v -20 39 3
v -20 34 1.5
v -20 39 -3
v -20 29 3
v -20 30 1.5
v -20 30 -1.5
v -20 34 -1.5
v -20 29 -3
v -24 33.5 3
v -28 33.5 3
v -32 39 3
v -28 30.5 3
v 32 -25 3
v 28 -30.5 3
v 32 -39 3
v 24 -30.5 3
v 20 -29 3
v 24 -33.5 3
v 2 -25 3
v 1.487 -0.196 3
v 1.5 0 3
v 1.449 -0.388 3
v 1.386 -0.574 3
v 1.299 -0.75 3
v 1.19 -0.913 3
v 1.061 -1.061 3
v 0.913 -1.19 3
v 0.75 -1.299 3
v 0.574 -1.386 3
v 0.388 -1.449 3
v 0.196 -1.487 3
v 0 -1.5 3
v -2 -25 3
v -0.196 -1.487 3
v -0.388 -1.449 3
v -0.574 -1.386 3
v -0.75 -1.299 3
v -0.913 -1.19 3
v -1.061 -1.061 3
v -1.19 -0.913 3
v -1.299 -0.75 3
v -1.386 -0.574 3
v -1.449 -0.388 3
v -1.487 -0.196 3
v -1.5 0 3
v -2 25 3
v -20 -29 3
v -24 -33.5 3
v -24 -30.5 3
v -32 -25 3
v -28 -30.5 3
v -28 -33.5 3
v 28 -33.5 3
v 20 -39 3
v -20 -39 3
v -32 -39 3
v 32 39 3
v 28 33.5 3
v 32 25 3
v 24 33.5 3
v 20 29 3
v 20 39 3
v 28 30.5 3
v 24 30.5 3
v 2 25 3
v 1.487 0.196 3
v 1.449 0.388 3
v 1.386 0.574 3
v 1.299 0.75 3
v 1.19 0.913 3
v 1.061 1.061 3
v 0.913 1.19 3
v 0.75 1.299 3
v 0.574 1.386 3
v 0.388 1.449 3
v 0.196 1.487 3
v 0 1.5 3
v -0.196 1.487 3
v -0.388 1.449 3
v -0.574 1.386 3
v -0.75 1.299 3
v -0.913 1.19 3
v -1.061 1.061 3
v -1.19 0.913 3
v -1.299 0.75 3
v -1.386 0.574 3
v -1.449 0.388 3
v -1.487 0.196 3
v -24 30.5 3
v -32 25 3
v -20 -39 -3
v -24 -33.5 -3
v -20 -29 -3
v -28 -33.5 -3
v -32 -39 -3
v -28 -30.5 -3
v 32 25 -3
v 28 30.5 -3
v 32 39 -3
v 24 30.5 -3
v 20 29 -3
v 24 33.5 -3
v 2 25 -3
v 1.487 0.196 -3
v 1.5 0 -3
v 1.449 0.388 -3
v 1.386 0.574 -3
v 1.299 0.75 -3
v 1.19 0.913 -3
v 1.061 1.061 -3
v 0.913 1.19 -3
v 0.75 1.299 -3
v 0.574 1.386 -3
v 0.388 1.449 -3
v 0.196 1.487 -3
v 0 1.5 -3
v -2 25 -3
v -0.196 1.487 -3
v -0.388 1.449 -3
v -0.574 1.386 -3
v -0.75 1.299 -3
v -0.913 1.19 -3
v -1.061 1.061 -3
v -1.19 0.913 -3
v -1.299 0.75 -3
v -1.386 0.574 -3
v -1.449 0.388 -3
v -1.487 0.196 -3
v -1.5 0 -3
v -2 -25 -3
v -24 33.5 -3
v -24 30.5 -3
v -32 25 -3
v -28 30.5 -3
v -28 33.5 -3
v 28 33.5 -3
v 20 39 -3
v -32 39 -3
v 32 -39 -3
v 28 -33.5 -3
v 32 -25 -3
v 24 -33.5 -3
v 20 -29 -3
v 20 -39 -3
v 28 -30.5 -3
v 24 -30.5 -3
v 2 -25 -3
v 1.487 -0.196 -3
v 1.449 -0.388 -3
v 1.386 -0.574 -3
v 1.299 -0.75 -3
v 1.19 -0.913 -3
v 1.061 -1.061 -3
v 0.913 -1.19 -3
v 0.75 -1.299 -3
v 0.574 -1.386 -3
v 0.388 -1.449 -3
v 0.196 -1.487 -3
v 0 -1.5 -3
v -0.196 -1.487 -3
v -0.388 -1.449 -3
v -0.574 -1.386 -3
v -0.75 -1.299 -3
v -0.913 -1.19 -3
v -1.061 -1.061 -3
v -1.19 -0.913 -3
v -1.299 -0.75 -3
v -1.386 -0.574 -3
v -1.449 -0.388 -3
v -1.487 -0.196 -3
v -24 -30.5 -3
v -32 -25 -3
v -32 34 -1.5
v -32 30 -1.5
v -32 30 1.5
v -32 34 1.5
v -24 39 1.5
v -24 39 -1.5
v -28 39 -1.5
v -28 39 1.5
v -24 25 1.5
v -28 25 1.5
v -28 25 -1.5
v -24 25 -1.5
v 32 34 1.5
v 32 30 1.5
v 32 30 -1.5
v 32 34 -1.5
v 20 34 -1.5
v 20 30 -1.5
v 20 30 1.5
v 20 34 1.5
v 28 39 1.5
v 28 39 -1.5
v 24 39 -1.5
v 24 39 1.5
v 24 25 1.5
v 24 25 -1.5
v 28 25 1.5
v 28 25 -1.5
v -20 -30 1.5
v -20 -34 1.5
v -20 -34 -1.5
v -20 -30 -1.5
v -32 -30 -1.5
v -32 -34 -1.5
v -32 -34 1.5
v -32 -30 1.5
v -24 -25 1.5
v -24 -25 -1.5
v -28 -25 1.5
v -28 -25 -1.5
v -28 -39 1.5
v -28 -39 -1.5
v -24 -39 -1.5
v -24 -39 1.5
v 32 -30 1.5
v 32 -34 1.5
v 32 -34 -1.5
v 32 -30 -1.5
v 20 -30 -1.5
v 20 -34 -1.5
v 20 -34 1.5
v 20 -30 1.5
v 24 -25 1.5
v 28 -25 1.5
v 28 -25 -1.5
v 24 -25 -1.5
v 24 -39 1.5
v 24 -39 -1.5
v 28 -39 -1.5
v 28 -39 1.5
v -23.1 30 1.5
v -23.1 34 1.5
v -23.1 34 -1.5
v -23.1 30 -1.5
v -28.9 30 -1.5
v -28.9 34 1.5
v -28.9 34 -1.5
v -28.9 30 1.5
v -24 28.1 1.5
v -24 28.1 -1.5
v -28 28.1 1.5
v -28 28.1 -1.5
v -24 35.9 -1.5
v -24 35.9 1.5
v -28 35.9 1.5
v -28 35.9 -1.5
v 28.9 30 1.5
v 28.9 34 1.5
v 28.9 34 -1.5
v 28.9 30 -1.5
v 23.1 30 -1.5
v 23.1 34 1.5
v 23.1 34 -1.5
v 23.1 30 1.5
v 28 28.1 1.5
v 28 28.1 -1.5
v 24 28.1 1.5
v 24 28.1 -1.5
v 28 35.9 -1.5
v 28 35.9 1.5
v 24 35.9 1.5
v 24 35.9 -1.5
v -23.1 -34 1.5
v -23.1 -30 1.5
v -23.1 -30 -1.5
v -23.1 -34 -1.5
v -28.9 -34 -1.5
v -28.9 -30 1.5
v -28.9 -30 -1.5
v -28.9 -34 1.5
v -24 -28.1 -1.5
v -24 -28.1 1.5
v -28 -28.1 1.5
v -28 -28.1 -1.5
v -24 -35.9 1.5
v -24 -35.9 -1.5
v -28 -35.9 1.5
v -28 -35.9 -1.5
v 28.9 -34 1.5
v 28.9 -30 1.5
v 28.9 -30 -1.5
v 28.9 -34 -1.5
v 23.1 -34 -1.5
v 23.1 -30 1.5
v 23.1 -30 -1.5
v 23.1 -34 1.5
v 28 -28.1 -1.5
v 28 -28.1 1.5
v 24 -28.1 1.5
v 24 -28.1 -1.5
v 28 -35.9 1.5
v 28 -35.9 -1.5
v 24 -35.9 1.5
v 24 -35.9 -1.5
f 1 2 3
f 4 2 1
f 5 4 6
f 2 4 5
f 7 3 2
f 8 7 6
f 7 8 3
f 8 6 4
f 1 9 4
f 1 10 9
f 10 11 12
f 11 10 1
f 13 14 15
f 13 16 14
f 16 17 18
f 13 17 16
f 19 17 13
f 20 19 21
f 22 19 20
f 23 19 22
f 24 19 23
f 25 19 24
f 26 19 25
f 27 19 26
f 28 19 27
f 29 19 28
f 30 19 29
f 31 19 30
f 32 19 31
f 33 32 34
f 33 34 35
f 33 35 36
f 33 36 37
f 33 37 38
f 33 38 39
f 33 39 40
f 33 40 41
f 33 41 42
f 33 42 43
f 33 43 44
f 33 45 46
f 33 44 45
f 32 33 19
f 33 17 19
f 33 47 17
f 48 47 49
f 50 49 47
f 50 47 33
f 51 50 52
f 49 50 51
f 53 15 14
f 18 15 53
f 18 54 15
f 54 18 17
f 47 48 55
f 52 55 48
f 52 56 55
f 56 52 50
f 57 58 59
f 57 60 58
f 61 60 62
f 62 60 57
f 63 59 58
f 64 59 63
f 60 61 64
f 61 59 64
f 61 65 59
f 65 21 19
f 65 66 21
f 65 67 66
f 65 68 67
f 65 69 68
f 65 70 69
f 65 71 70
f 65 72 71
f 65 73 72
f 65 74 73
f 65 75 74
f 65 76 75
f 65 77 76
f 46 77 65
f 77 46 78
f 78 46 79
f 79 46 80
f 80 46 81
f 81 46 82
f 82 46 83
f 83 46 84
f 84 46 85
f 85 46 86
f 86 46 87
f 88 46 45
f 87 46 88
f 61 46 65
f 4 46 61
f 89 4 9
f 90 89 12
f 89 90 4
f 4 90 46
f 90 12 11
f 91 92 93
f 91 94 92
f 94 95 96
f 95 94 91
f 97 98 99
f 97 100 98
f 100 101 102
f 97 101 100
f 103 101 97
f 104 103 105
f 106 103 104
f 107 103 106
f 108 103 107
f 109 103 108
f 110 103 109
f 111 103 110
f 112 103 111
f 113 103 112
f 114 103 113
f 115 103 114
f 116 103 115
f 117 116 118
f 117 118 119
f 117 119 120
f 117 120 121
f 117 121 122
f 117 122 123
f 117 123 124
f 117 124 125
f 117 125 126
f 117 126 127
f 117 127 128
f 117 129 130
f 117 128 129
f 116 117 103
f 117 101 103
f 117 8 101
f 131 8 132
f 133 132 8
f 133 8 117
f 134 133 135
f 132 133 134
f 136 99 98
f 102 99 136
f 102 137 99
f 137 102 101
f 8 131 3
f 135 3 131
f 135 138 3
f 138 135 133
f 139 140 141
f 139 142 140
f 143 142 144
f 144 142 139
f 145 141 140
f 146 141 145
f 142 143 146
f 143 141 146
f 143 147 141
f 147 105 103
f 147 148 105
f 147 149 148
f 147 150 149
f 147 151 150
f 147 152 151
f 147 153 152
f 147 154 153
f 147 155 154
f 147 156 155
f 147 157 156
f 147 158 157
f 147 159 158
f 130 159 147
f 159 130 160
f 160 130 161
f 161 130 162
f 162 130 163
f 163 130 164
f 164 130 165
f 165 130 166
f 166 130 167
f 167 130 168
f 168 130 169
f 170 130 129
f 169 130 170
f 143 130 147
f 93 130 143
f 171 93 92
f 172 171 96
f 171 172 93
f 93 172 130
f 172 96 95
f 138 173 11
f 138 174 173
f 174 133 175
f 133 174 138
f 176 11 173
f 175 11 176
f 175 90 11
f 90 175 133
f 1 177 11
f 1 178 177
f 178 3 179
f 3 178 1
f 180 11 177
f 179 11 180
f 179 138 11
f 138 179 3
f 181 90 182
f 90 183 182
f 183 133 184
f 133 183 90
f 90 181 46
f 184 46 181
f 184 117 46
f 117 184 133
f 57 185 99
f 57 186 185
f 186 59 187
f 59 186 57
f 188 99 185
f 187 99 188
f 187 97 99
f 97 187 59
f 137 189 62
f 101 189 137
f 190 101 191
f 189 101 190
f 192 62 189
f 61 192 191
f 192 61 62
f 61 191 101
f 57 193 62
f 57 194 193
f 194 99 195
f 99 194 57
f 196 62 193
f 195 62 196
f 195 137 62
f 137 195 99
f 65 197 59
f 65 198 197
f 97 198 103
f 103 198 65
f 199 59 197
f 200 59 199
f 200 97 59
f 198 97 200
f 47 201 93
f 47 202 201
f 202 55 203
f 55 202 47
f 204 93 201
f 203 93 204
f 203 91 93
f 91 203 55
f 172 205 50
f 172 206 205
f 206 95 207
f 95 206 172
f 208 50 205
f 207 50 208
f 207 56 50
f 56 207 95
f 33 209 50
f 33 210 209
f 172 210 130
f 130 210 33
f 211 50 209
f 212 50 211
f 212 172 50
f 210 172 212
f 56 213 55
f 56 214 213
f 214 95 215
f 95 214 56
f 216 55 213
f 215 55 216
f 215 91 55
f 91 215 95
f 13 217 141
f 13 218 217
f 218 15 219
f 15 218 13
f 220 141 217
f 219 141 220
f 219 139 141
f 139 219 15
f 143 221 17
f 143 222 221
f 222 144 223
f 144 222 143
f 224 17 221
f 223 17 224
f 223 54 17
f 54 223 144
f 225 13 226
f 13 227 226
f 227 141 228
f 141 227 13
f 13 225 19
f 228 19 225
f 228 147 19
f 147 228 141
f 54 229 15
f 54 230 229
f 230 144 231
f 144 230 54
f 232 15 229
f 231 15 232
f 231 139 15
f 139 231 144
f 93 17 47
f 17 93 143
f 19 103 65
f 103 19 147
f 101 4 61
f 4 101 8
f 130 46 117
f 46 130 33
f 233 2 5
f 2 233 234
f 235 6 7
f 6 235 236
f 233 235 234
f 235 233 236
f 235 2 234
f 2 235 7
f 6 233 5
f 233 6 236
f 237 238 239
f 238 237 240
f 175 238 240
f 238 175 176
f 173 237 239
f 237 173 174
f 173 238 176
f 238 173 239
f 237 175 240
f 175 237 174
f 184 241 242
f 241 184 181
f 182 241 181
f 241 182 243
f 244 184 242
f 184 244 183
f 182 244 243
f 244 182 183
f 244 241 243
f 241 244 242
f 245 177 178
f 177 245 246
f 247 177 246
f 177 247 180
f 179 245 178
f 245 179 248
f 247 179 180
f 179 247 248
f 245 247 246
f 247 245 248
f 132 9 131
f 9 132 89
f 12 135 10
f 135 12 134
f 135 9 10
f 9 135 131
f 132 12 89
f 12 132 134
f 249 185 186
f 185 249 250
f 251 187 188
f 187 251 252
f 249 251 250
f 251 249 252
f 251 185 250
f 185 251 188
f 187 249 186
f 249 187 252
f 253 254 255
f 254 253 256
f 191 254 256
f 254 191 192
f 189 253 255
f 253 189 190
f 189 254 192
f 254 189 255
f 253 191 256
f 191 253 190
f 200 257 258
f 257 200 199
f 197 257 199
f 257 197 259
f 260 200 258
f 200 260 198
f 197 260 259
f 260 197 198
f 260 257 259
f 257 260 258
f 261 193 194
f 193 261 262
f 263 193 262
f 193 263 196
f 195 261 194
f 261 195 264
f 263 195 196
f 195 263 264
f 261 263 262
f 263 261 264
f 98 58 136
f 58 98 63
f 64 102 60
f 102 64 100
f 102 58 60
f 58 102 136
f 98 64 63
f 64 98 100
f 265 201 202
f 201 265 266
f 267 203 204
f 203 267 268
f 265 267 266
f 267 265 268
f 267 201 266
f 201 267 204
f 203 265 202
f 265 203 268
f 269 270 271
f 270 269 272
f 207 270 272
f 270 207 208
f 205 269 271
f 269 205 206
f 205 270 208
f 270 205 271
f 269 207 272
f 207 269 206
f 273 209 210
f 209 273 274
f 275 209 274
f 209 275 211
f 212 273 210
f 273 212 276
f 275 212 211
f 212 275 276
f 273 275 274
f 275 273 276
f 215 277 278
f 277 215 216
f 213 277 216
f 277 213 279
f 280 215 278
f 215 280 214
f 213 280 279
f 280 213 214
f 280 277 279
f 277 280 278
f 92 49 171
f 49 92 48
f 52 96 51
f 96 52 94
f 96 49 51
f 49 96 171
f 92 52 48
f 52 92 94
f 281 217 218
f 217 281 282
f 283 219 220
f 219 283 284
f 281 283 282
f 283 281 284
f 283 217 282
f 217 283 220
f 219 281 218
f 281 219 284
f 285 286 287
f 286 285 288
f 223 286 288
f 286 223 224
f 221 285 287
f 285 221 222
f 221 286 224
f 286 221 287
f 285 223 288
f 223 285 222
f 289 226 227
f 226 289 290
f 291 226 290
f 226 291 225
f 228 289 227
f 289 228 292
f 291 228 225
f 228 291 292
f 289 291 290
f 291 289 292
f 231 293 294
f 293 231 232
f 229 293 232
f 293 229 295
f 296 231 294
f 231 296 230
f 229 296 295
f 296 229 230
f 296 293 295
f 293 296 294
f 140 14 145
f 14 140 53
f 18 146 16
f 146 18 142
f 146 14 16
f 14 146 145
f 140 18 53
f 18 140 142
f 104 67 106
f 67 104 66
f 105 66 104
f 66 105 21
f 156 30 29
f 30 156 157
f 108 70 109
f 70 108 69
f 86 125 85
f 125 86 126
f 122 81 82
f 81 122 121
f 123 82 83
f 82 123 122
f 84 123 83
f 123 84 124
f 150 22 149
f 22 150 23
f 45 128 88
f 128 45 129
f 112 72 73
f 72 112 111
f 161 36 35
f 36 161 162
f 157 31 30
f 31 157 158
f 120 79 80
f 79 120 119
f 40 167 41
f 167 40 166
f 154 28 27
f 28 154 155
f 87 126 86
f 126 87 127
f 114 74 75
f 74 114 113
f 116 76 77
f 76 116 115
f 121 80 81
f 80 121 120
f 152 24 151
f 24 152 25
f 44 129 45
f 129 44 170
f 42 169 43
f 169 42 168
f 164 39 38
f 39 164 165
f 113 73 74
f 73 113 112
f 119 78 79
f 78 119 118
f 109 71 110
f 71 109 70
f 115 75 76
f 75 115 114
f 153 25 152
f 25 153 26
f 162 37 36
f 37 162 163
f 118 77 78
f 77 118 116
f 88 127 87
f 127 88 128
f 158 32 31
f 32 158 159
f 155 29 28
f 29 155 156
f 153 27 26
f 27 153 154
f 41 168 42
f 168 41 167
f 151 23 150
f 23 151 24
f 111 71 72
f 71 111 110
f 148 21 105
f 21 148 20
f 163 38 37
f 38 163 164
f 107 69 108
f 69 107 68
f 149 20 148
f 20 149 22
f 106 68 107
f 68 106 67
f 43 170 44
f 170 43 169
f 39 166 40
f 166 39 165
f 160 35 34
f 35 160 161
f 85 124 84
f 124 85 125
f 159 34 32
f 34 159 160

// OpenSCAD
// 工字形 (I / H 形) 参数化模型 + 4 末端凹形 (U 形槽)
//  凹──────────────凹   <- 上横段两端：凹口向上
//  └──────┬──────┘
//         │            <- 中竖段 web_len
//    凸────┴────凸      <- 下横段两端：凹口向下（即凹形倒置）
//
// 单位：所有尺寸均为毫米 (mm)，1 OpenSCAD 单位 = 1 mm，导出 STL 直接按毫米

/* [基本参数] */
// 笔画粗细（三根线段的宽度/厚度）
thickness = 4;      // 粗细 (mm)
// 上横段长度
top_len    = 40;    // 第1根线段 (mm)
// 中竖段长度
web_len    = 50;    // 第2根线段 (mm)
// 下横段长度
bottom_len = 40;    // 第3根线段 (mm)

/* [3D 拉伸] */
// 工字形拉伸高度（设为 0 则只画 2D 平面）
depth = 6;          // (mm)
// 工字形相对末端凹形的 Z 轴偏移量（末端凹形固定在 Z 中心；正值使工字形向 +Z 移动）
beam_z = 0;         // (mm)
// 工字竖段(中竖段)中心沿 Z 轴的圆通孔直径（≤0 不开孔；需 < thickness 才完全落在竖段内）
web_hole_d = 3;     // (mm)

/* [末端凹形] —— U 形槽，由 4 个参数控制 */
// 凹口宽度（X 方向，两壁之间的开口宽度）
notch_w = 6;        // (mm)
// 深度（Z 方向，凹形拉伸厚度；设为 0 则自动跟随工字形 depth，与主体同厚、两面齐平）
concave_d = 0;      // (mm)
// 高度（Y 方向，凹形伸出横段表面的净高度）
concave_h = 10;     // (mm)
// 壁厚（两侧壁 + ±Z 两面壁(−Z 底壁/+Z 顶壁)的厚度；外廓宽 = 凹口宽 + 2×壁厚；需 深度 > 2×壁厚 才有槽腔）
wall = 3;           // (mm)

/* [末端凹形 — 6 个面矩形通孔] */
// 凹形为六面封闭空心盒；在每个末端的 6 个面（左/右侧壁、底壁、背壁、顶壁、凹口壁）中心各开一个矩形通孔。
// 每个面单独设置：size=[长, 宽]；off=[沿“长”偏移, 沿“宽”偏移]（相对该面中心，mm）。
// 某面 size 的长或宽 <= 0 则该面不开孔。
hole_enable = true;
// 右侧壁 (+X 面)：长沿 Y、宽沿 Z；off=[ΔY, ΔZ]
hole_xp_size = [4, 3];
hole_xp_off  = [0, 0];
// 左侧壁 (−X 面)：长沿 Y、宽沿 Z；off=[ΔY, ΔZ]
hole_xn_size = [4, 3];
hole_xn_off  = [0, 0];
// 底壁 (背离开口的 Y 面)：长沿 X、宽沿 Z；off=[ΔX, ΔZ]
hole_yb_size = [4, 3];
hole_yb_off  = [0, 0];
// 背壁 (−Z 面)：长沿 X、宽沿 Y；off=[ΔX, ΔY]
hole_zn_size = [4, 3];
hole_zn_off  = [0, 0];
// 顶壁 (+Z 面，正上方那面)：长沿 X、宽沿 Y；off=[ΔX, ΔY]
hole_zp_size = [4, 3];
hole_zp_off  = [0, 0];
// 凹口壁 (开口侧 Y 面)：长沿 X、宽沿 Z；off=[ΔX, ΔZ]
hole_ym_size = [4, 3];
hole_ym_off  = [0, 0];

// ---- 工字形主体 ----
module i_beam_2d(thickness, top_len, web_len, bottom_len) {
    // 上横段：顶部居中
    translate([0, web_len/2 + thickness/2])
        square([top_len, thickness], center = true);

    // 中竖段：正中央
    square([thickness, web_len], center = true);

    // 下横段：底部居中
    translate([0, -(web_len/2 + thickness/2)])
        square([bottom_len, thickness], center = true);
}

module i_beam(thickness, top_len, web_len, bottom_len, depth = 0) {
    if (depth > 0)
        linear_extrude(height = depth, center = true)
            i_beam_2d(thickness, top_len, web_len, bottom_len);
    else
        i_beam_2d(thickness, top_len, web_len, bottom_len);
}

// ---- 末端凹形 (U 形槽) ----
// 思路：先把"实心外块"与工字并集，再统一挖"凹槽"。这样凹槽会同时穿过外块和
//      搭接处的横段材料——无论 thickness 多大，槽内都干净，不会被横段穿透。
// 几何约定：外廓宽 = notch_w + 2*wall；Y 向总高 = concave_h(净伸出) + thickness(搭接)；
//          内侧与横段内沿齐平，底部保留 wall 壁厚作底。

// 横段长度 = 两个凹形相对(内)侧之间的距离：凹形内侧边钉在 ±len/2，只向外伸出。
//   len=0 → 两凹形内侧紧贴、不重叠；len>0 → 内侧间距 = len。块中心 = 内侧 + overall_w/2。

// 4 个末端的实心外块（外廓矩形，未挖槽）
module end_blocks(top_len, web_len, bottom_len, thickness, notch_w, cd, concave_h, wall) {
    ty = web_len/2 + thickness/2;
    by = -(web_len/2 + thickness/2);
    overall_w = notch_w + 2 * wall;
    H = concave_h + thickness;
    // 上端：内侧边在 ±top_len/2，向外伸出
    for (s = [-1, 1])
        translate([s * (top_len/2 + overall_w/2), ty + concave_h/2, 0])
            cube([overall_w, H, cd], center = true);
    // 下端：内侧边在 ±bottom_len/2，向外伸出
    for (s = [-1, 1])
        translate([s * (bottom_len/2 + overall_w/2), by - concave_h/2, 0])
            cube([overall_w, H, cd], center = true);
}

// 4 个末端的凹槽切口（X 与对应外块同心；Z 向两面各留 wall：−Z 底壁 + 正上方 +Z 顶壁）
//   注意：需 cd > 2*wall 才有槽腔（两面各占 wall）；cd ≤ 2*wall 时槽腔归零、凹形变实心。
module end_slots(top_len, web_len, bottom_len, thickness, notch_w, cd, concave_h, wall) {
    ty = web_len/2 + thickness/2;
    by = -(web_len/2 + thickness/2);
    overall_w = notch_w + 2 * wall;
    H = concave_h + thickness;
    // 内腔居中，六面各留 wall：±X 侧壁、内侧 Y 底壁 + 外侧 Y 凹口壁、−Z 底壁 + +Z 顶壁 → 空心盒
    //   需 H > 2*wall 且 cd > 2*wall 才有内腔（否则该向变实心）。
    sz = [notch_w, H - 2 * wall, cd - 2 * wall];
    // 上端
    for (s = [-1, 1])
        translate([s * (top_len/2 + overall_w/2), ty + concave_h/2, 0])
            cube(sz, center = true);
    // 下端
    for (s = [-1, 1])
        translate([s * (bottom_len/2 + overall_w/2), by - concave_h/2, 0])
            cube(sz, center = true);
}

// 4 个末端凹形：在每个的 6 个面（±X 侧壁、内侧 Y 底壁、−Z 背壁、+Z 顶壁、外侧 Y 凹口壁）中心开矩形通孔。
//   每个面单独取 size=[长,宽] 与 off=[沿长偏移,沿宽偏移]（轴向映射见各 cube 注释）；
//   通孔深度略大于壁厚，确保切穿；某面长或宽 <= 0 则跳过。
module end_holes(top_len, web_len, bottom_len, thickness, notch_w, cd, concave_h, wall) {
    ty = web_len/2 + thickness/2;
    by = -(web_len/2 + thickness/2);
    overall_w = notch_w + 2 * wall;
    H = concave_h + thickness;
    eps = 0.1;
    t = wall + 2 * eps;                 // 通孔穿透深度（略大于壁厚）

    // 单个末端的 4 面孔：bx/by0 = 该末端中心；dir = 开口的 Y 朝向(+1 朝 +Y，-1 朝 −Y)
    module one_end(bx, by0, dir) {
        // 右侧壁 (+X 面)：孔面在 Y-Z 平面 → 长沿 Y、宽沿 Z；穿透沿 X；off=[ΔY, ΔZ]
        if (hole_xp_size[0] > 0 && hole_xp_size[1] > 0)
            translate([bx + (notch_w + wall)/2, by0 + hole_xp_off[0], hole_xp_off[1]])
                cube([t, hole_xp_size[0], hole_xp_size[1]], center = true);
        // 左侧壁 (−X 面)：孔面在 Y-Z 平面 → 长沿 Y、宽沿 Z；穿透沿 X；off=[ΔY, ΔZ]
        if (hole_xn_size[0] > 0 && hole_xn_size[1] > 0)
            translate([bx - (notch_w + wall)/2, by0 + hole_xn_off[0], hole_xn_off[1]])
                cube([t, hole_xn_size[0], hole_xn_size[1]], center = true);
        // 底壁 (背离开口的 Y 面，即 −dir 侧)：孔面在 X-Z 平面 → 长沿 X、宽沿 Z；穿透沿 Y；off=[ΔX, ΔZ]
        if (hole_yb_size[0] > 0 && hole_yb_size[1] > 0)
            translate([bx + hole_yb_off[0], by0 - dir * (H - wall)/2, hole_yb_off[1]])
                cube([hole_yb_size[0], t, hole_yb_size[1]], center = true);
        // 凹口壁 (开口侧 Y 面，即 +dir 侧)：孔面在 X-Z 平面 → 长沿 X、宽沿 Z；穿透沿 Y；off=[ΔX, ΔZ]
        if (hole_ym_size[0] > 0 && hole_ym_size[1] > 0)
            translate([bx + hole_ym_off[0], by0 + dir * (H - wall)/2, hole_ym_off[1]])
                cube([hole_ym_size[0], t, hole_ym_size[1]], center = true);
        // 背壁 (−Z 面)：孔面在 X-Y 平面 → 长沿 X、宽沿 Y；穿透沿 Z；off=[ΔX, ΔY]
        if (hole_zn_size[0] > 0 && hole_zn_size[1] > 0)
            translate([bx + hole_zn_off[0], by0 + hole_zn_off[1], -cd/2 + wall/2])
                cube([hole_zn_size[0], hole_zn_size[1], t], center = true);
        // 顶壁 (+Z 面)：孔面在 X-Y 平面 → 长沿 X、宽沿 Y；穿透沿 Z；off=[ΔX, ΔY]
        if (hole_zp_size[0] > 0 && hole_zp_size[1] > 0)
            translate([bx + hole_zp_off[0], by0 + hole_zp_off[1], cd/2 - wall/2])
                cube([hole_zp_size[0], hole_zp_size[1], t], center = true);
    }

    // 上端两个：开口朝 +Y
    for (s = [-1, 1])
        one_end(s * (top_len/2 + overall_w/2), ty + concave_h/2, +1);
    // 下端两个：开口朝 −Y
    for (s = [-1, 1])
        one_end(s * (bottom_len/2 + overall_w/2), by - concave_h/2, -1);
}

// ---- 渲染 ----
// 凹形深度：0 表示跟随工字形 depth（与主体同厚、两面齐平）
concave_d_eff = (concave_d > 0) ? concave_d : depth;
difference() {
    union() {
        translate([0, 0, beam_z])
            i_beam(thickness, top_len, web_len, bottom_len, depth);
        end_blocks(top_len, web_len, bottom_len, thickness, notch_w, concave_d_eff, concave_h, wall);
    }
    end_slots(top_len, web_len, bottom_len, thickness, notch_w, concave_d_eff, concave_h, wall);
    if (hole_enable)
        end_holes(top_len, web_len, bottom_len, thickness, notch_w, concave_d_eff, concave_h, wall);
    // 工字竖段中心：沿 Z 轴的圆通孔（随工字一起在 Z 向偏移 beam_z）
    if (web_hole_d > 0)
        translate([0, 0, beam_z])
            cylinder(h = depth + 2, d = web_hole_d, center = true, $fn = 48);
}
